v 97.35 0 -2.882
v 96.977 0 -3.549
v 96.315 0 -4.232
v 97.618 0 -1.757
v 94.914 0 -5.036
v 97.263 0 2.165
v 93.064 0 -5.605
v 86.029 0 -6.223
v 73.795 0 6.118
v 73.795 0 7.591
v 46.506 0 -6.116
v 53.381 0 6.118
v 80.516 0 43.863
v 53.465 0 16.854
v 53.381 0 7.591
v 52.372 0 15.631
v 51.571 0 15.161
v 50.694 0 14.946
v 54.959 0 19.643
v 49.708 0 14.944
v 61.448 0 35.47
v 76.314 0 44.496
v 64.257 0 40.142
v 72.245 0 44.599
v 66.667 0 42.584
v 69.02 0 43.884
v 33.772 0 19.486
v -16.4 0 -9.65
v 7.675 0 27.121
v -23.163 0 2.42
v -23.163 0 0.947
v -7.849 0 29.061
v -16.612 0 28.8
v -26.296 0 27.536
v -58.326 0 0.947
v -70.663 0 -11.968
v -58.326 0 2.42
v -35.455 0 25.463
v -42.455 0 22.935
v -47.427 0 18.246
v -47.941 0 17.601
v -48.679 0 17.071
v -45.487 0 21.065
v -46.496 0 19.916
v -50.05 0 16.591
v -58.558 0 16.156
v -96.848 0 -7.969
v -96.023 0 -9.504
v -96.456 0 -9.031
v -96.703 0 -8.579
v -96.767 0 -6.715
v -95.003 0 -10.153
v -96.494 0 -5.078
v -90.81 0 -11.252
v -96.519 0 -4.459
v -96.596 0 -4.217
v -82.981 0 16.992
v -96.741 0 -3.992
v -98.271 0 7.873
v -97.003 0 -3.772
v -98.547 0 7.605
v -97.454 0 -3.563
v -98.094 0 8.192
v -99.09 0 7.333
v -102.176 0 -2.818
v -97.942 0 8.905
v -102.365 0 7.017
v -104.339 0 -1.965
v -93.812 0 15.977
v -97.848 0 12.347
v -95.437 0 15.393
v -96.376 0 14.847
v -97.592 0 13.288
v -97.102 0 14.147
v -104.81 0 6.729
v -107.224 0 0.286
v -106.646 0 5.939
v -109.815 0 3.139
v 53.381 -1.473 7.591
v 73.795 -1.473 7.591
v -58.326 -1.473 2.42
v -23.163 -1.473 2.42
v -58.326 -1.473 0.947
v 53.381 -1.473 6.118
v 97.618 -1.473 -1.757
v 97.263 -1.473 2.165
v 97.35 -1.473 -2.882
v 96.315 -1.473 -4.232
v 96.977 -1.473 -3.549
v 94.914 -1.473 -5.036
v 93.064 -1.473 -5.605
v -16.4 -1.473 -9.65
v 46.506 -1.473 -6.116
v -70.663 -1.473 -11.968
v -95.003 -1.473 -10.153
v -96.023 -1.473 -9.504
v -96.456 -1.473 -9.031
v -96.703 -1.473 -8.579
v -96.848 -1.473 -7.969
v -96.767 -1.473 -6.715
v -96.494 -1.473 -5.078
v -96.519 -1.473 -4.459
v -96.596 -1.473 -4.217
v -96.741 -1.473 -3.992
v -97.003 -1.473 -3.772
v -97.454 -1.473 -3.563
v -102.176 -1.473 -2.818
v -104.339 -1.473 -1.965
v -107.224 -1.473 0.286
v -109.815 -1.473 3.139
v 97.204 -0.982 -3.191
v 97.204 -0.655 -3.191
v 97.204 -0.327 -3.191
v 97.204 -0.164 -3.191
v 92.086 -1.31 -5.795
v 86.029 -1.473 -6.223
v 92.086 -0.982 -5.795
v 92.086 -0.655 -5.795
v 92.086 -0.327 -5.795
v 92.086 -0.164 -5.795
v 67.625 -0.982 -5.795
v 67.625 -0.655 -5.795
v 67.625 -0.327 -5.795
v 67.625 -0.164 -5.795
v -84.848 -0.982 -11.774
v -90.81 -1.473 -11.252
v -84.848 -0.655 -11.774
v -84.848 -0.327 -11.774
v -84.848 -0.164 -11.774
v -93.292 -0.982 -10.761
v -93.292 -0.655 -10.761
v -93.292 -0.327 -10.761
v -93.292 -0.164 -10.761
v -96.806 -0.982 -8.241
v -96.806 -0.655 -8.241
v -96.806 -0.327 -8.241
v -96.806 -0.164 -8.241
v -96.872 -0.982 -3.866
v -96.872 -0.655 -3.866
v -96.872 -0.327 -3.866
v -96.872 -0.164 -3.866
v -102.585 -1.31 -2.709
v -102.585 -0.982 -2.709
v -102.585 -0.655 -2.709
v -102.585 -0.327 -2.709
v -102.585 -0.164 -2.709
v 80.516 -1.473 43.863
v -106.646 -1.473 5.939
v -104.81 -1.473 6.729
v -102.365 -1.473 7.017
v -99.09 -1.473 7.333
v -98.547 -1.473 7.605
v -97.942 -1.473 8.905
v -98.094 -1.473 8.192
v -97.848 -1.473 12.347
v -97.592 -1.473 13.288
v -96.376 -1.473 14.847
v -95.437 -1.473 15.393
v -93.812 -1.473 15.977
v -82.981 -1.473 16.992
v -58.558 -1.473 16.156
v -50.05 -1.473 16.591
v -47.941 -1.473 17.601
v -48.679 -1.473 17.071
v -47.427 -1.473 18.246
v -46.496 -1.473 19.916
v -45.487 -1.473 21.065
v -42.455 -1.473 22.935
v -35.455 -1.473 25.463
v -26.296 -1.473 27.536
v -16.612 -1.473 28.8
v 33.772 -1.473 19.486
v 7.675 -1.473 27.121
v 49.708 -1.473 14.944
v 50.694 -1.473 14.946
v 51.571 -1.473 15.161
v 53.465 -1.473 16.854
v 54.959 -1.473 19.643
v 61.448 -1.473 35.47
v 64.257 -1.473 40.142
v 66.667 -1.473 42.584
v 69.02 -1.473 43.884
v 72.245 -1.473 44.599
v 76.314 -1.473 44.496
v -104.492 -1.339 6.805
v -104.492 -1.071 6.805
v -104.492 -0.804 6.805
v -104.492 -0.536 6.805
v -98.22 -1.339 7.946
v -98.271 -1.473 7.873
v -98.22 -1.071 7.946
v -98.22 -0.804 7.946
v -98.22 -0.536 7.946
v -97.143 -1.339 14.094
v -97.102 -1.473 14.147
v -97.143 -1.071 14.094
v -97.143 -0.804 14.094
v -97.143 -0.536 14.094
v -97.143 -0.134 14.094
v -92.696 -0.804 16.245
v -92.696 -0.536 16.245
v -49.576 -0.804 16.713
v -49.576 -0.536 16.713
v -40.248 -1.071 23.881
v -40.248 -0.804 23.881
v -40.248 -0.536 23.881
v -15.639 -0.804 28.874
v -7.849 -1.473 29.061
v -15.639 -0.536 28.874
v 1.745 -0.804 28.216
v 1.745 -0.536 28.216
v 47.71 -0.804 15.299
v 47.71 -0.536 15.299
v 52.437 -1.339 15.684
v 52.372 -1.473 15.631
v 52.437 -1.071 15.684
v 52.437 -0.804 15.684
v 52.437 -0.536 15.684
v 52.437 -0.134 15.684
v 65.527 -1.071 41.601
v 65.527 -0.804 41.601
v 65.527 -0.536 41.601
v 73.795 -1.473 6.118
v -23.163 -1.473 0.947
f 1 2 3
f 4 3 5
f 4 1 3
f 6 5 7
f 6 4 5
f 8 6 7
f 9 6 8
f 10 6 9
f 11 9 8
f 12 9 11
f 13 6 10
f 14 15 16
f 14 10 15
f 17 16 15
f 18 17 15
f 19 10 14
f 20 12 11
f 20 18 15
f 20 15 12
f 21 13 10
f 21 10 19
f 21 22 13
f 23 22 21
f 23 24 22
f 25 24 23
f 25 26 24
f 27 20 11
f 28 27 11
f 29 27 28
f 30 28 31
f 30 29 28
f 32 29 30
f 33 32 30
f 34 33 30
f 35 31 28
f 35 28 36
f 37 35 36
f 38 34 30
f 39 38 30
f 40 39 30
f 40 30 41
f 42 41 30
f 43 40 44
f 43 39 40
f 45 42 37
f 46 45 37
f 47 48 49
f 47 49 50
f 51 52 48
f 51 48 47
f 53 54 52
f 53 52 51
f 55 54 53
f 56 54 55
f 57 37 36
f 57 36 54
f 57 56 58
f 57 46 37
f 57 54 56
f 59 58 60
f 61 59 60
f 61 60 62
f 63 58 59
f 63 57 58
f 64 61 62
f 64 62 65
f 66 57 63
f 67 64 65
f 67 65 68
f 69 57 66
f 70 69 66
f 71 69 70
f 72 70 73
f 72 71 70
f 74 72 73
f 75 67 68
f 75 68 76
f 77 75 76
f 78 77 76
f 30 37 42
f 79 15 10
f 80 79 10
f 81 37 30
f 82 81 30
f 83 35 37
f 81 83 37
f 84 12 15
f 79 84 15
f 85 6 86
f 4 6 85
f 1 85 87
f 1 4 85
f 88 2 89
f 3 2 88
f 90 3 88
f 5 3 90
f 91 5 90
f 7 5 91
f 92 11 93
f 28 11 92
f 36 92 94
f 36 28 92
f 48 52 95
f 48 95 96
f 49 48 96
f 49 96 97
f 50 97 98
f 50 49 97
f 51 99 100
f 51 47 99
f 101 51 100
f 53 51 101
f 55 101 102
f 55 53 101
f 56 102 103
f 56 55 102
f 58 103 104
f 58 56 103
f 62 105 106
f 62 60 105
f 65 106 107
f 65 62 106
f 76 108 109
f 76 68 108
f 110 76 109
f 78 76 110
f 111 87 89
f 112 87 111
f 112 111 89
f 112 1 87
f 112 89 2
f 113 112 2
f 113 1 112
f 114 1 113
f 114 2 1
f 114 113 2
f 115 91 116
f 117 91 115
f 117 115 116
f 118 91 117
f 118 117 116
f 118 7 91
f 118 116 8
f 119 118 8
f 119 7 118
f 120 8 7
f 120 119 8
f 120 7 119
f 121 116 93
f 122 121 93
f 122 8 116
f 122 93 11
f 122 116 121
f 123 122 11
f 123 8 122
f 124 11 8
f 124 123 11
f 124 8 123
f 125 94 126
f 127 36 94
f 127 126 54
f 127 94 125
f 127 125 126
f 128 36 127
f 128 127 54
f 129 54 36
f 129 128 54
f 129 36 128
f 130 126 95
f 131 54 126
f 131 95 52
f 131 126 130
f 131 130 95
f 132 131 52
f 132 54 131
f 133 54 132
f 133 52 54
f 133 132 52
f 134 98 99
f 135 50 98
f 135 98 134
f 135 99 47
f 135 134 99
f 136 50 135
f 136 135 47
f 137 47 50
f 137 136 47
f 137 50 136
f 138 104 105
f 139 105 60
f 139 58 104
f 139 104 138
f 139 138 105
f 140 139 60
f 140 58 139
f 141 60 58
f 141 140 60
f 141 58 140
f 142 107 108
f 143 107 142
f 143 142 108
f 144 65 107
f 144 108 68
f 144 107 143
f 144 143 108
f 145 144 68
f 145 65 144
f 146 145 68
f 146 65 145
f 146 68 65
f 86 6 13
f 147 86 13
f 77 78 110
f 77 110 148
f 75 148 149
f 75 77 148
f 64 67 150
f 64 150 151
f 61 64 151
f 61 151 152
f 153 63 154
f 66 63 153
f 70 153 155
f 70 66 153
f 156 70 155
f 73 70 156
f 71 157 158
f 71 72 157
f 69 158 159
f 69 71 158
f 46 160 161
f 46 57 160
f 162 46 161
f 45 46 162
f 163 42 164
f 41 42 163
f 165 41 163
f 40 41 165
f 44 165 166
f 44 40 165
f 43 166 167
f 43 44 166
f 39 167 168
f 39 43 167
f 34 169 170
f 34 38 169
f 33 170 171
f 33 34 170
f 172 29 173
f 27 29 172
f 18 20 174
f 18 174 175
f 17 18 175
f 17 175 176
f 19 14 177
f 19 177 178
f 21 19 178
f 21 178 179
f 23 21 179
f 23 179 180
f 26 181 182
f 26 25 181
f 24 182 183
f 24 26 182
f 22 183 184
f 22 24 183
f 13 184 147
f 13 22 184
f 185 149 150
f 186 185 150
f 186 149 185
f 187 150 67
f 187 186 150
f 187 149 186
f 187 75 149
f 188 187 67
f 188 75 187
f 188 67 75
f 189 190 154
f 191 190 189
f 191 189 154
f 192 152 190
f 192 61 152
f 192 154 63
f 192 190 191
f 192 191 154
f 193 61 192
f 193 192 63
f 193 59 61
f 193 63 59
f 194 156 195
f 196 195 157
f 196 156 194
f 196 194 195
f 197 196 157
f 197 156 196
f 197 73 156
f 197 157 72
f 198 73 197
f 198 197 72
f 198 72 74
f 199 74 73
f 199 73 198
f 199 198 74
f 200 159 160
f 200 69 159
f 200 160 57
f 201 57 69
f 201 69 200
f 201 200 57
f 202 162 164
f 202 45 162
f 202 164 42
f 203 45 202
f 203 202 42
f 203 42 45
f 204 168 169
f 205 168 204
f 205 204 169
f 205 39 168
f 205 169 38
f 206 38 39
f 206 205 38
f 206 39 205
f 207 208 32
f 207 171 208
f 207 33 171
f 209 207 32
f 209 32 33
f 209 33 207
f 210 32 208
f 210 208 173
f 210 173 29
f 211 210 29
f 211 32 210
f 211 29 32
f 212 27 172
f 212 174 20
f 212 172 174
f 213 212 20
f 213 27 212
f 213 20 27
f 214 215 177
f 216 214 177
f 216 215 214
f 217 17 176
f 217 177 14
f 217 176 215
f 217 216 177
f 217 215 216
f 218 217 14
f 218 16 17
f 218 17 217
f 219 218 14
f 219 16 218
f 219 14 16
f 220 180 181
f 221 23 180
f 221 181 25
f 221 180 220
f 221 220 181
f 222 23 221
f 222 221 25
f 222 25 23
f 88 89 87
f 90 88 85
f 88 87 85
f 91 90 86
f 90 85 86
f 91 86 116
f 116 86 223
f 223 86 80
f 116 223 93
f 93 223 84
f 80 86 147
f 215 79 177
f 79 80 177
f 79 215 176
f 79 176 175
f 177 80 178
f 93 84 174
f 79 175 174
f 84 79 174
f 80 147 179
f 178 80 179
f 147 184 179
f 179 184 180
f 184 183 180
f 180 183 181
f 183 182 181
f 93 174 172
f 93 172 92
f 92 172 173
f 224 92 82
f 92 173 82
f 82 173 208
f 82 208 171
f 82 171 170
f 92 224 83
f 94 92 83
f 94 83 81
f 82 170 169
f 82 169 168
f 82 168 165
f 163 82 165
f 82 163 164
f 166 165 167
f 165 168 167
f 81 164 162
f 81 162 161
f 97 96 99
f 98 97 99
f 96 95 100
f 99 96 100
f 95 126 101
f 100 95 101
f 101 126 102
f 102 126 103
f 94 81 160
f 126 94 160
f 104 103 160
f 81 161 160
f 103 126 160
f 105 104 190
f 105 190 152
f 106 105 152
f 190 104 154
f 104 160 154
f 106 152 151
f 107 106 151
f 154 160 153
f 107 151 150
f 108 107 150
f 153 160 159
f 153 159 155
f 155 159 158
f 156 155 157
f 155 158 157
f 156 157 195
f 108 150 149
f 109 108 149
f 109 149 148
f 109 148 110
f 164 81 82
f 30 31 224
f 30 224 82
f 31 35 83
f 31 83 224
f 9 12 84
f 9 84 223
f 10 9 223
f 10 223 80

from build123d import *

# Parameters (mm, degrees)
F0_W     = 35.1627948
F0_H     = 1.4732
F0_W_2   = 20.4145642
F1_DEPTH = 1.4732


with BuildPart() as f1:
    # F0 (on Front) → F1 (new body)
    with BuildSketch(Plane.XZ):
        with BuildLine():
            add(Edge.make_bspline(
                [(-109.8149493337, 3.1385479961), (-108.2937410986, 4.7398612041), (-105.2733241214, 7.9193296609), (-95.8169200558, 5.9936022895), (-103.0716930292, 21.8166749639), (-45.8800330673, 12.6839948586), (-48.3322256634, 23.004533034), (-12.4588899674, 31.7195768008), (16.137292802, 25.7993579285), (46.9605962111, 14.806579809), (55.1164949058, 14.4987773217), (62.3515511385, 46.964729651), (75.0967249279, 44.7885180128), (80.5161073804, 43.8631698489)],
                knots=[0, 0, 0, 0, 0.0561293893, 0.1114470434, 0.1696318028, 0.3204203123, 0.3715525192, 0.4947237521, 0.6234375718, 0.7454655046, 0.798580671, 0.9143543748, 1, 1, 1, 1], degree=3))
            add(Edge.make_bspline(
                [(97.2629711032, 2.1647161338), (97.5995889647, 0.231244202), (98.2917377632, -3.7443329366), (90.9558829096, -7.0523158948), (63.8361527594, -4.7333392277), (4.1277144575, -8.412753388), (-80.3541566536, -13.580831774), (-98.8138785968, -10.1346397531), (-94.9099022927, -2.7372264279), (-103.7875835133, -3.8642697161), (-107.6701807606, 0.6466761237), (-109.8149493337, 3.1385479961)],
                knots=[0, 0, 0, 0, 0.0599988401, 0.1233687508, 0.2529805516, 0.4647275706, 0.7095930047, 0.8021344628, 0.8553335095, 0.9200854164, 1, 1, 1, 1], degree=3))
            Line((97.2629711032, 2.1647161338), (80.5161073804, 43.8631698489))
        make_face()
        with Locations((-40.7441928983, 1.6833419213)):
            Rectangle(F0_W, F0_H, mode=Mode.SUBTRACT)
        with Locations((63.5878294706, 6.8548019044)):
            Rectangle(F0_W_2, F0_H, mode=Mode.SUBTRACT)
    extrude(amount=F1_DEPTH)


solid = f1.part
